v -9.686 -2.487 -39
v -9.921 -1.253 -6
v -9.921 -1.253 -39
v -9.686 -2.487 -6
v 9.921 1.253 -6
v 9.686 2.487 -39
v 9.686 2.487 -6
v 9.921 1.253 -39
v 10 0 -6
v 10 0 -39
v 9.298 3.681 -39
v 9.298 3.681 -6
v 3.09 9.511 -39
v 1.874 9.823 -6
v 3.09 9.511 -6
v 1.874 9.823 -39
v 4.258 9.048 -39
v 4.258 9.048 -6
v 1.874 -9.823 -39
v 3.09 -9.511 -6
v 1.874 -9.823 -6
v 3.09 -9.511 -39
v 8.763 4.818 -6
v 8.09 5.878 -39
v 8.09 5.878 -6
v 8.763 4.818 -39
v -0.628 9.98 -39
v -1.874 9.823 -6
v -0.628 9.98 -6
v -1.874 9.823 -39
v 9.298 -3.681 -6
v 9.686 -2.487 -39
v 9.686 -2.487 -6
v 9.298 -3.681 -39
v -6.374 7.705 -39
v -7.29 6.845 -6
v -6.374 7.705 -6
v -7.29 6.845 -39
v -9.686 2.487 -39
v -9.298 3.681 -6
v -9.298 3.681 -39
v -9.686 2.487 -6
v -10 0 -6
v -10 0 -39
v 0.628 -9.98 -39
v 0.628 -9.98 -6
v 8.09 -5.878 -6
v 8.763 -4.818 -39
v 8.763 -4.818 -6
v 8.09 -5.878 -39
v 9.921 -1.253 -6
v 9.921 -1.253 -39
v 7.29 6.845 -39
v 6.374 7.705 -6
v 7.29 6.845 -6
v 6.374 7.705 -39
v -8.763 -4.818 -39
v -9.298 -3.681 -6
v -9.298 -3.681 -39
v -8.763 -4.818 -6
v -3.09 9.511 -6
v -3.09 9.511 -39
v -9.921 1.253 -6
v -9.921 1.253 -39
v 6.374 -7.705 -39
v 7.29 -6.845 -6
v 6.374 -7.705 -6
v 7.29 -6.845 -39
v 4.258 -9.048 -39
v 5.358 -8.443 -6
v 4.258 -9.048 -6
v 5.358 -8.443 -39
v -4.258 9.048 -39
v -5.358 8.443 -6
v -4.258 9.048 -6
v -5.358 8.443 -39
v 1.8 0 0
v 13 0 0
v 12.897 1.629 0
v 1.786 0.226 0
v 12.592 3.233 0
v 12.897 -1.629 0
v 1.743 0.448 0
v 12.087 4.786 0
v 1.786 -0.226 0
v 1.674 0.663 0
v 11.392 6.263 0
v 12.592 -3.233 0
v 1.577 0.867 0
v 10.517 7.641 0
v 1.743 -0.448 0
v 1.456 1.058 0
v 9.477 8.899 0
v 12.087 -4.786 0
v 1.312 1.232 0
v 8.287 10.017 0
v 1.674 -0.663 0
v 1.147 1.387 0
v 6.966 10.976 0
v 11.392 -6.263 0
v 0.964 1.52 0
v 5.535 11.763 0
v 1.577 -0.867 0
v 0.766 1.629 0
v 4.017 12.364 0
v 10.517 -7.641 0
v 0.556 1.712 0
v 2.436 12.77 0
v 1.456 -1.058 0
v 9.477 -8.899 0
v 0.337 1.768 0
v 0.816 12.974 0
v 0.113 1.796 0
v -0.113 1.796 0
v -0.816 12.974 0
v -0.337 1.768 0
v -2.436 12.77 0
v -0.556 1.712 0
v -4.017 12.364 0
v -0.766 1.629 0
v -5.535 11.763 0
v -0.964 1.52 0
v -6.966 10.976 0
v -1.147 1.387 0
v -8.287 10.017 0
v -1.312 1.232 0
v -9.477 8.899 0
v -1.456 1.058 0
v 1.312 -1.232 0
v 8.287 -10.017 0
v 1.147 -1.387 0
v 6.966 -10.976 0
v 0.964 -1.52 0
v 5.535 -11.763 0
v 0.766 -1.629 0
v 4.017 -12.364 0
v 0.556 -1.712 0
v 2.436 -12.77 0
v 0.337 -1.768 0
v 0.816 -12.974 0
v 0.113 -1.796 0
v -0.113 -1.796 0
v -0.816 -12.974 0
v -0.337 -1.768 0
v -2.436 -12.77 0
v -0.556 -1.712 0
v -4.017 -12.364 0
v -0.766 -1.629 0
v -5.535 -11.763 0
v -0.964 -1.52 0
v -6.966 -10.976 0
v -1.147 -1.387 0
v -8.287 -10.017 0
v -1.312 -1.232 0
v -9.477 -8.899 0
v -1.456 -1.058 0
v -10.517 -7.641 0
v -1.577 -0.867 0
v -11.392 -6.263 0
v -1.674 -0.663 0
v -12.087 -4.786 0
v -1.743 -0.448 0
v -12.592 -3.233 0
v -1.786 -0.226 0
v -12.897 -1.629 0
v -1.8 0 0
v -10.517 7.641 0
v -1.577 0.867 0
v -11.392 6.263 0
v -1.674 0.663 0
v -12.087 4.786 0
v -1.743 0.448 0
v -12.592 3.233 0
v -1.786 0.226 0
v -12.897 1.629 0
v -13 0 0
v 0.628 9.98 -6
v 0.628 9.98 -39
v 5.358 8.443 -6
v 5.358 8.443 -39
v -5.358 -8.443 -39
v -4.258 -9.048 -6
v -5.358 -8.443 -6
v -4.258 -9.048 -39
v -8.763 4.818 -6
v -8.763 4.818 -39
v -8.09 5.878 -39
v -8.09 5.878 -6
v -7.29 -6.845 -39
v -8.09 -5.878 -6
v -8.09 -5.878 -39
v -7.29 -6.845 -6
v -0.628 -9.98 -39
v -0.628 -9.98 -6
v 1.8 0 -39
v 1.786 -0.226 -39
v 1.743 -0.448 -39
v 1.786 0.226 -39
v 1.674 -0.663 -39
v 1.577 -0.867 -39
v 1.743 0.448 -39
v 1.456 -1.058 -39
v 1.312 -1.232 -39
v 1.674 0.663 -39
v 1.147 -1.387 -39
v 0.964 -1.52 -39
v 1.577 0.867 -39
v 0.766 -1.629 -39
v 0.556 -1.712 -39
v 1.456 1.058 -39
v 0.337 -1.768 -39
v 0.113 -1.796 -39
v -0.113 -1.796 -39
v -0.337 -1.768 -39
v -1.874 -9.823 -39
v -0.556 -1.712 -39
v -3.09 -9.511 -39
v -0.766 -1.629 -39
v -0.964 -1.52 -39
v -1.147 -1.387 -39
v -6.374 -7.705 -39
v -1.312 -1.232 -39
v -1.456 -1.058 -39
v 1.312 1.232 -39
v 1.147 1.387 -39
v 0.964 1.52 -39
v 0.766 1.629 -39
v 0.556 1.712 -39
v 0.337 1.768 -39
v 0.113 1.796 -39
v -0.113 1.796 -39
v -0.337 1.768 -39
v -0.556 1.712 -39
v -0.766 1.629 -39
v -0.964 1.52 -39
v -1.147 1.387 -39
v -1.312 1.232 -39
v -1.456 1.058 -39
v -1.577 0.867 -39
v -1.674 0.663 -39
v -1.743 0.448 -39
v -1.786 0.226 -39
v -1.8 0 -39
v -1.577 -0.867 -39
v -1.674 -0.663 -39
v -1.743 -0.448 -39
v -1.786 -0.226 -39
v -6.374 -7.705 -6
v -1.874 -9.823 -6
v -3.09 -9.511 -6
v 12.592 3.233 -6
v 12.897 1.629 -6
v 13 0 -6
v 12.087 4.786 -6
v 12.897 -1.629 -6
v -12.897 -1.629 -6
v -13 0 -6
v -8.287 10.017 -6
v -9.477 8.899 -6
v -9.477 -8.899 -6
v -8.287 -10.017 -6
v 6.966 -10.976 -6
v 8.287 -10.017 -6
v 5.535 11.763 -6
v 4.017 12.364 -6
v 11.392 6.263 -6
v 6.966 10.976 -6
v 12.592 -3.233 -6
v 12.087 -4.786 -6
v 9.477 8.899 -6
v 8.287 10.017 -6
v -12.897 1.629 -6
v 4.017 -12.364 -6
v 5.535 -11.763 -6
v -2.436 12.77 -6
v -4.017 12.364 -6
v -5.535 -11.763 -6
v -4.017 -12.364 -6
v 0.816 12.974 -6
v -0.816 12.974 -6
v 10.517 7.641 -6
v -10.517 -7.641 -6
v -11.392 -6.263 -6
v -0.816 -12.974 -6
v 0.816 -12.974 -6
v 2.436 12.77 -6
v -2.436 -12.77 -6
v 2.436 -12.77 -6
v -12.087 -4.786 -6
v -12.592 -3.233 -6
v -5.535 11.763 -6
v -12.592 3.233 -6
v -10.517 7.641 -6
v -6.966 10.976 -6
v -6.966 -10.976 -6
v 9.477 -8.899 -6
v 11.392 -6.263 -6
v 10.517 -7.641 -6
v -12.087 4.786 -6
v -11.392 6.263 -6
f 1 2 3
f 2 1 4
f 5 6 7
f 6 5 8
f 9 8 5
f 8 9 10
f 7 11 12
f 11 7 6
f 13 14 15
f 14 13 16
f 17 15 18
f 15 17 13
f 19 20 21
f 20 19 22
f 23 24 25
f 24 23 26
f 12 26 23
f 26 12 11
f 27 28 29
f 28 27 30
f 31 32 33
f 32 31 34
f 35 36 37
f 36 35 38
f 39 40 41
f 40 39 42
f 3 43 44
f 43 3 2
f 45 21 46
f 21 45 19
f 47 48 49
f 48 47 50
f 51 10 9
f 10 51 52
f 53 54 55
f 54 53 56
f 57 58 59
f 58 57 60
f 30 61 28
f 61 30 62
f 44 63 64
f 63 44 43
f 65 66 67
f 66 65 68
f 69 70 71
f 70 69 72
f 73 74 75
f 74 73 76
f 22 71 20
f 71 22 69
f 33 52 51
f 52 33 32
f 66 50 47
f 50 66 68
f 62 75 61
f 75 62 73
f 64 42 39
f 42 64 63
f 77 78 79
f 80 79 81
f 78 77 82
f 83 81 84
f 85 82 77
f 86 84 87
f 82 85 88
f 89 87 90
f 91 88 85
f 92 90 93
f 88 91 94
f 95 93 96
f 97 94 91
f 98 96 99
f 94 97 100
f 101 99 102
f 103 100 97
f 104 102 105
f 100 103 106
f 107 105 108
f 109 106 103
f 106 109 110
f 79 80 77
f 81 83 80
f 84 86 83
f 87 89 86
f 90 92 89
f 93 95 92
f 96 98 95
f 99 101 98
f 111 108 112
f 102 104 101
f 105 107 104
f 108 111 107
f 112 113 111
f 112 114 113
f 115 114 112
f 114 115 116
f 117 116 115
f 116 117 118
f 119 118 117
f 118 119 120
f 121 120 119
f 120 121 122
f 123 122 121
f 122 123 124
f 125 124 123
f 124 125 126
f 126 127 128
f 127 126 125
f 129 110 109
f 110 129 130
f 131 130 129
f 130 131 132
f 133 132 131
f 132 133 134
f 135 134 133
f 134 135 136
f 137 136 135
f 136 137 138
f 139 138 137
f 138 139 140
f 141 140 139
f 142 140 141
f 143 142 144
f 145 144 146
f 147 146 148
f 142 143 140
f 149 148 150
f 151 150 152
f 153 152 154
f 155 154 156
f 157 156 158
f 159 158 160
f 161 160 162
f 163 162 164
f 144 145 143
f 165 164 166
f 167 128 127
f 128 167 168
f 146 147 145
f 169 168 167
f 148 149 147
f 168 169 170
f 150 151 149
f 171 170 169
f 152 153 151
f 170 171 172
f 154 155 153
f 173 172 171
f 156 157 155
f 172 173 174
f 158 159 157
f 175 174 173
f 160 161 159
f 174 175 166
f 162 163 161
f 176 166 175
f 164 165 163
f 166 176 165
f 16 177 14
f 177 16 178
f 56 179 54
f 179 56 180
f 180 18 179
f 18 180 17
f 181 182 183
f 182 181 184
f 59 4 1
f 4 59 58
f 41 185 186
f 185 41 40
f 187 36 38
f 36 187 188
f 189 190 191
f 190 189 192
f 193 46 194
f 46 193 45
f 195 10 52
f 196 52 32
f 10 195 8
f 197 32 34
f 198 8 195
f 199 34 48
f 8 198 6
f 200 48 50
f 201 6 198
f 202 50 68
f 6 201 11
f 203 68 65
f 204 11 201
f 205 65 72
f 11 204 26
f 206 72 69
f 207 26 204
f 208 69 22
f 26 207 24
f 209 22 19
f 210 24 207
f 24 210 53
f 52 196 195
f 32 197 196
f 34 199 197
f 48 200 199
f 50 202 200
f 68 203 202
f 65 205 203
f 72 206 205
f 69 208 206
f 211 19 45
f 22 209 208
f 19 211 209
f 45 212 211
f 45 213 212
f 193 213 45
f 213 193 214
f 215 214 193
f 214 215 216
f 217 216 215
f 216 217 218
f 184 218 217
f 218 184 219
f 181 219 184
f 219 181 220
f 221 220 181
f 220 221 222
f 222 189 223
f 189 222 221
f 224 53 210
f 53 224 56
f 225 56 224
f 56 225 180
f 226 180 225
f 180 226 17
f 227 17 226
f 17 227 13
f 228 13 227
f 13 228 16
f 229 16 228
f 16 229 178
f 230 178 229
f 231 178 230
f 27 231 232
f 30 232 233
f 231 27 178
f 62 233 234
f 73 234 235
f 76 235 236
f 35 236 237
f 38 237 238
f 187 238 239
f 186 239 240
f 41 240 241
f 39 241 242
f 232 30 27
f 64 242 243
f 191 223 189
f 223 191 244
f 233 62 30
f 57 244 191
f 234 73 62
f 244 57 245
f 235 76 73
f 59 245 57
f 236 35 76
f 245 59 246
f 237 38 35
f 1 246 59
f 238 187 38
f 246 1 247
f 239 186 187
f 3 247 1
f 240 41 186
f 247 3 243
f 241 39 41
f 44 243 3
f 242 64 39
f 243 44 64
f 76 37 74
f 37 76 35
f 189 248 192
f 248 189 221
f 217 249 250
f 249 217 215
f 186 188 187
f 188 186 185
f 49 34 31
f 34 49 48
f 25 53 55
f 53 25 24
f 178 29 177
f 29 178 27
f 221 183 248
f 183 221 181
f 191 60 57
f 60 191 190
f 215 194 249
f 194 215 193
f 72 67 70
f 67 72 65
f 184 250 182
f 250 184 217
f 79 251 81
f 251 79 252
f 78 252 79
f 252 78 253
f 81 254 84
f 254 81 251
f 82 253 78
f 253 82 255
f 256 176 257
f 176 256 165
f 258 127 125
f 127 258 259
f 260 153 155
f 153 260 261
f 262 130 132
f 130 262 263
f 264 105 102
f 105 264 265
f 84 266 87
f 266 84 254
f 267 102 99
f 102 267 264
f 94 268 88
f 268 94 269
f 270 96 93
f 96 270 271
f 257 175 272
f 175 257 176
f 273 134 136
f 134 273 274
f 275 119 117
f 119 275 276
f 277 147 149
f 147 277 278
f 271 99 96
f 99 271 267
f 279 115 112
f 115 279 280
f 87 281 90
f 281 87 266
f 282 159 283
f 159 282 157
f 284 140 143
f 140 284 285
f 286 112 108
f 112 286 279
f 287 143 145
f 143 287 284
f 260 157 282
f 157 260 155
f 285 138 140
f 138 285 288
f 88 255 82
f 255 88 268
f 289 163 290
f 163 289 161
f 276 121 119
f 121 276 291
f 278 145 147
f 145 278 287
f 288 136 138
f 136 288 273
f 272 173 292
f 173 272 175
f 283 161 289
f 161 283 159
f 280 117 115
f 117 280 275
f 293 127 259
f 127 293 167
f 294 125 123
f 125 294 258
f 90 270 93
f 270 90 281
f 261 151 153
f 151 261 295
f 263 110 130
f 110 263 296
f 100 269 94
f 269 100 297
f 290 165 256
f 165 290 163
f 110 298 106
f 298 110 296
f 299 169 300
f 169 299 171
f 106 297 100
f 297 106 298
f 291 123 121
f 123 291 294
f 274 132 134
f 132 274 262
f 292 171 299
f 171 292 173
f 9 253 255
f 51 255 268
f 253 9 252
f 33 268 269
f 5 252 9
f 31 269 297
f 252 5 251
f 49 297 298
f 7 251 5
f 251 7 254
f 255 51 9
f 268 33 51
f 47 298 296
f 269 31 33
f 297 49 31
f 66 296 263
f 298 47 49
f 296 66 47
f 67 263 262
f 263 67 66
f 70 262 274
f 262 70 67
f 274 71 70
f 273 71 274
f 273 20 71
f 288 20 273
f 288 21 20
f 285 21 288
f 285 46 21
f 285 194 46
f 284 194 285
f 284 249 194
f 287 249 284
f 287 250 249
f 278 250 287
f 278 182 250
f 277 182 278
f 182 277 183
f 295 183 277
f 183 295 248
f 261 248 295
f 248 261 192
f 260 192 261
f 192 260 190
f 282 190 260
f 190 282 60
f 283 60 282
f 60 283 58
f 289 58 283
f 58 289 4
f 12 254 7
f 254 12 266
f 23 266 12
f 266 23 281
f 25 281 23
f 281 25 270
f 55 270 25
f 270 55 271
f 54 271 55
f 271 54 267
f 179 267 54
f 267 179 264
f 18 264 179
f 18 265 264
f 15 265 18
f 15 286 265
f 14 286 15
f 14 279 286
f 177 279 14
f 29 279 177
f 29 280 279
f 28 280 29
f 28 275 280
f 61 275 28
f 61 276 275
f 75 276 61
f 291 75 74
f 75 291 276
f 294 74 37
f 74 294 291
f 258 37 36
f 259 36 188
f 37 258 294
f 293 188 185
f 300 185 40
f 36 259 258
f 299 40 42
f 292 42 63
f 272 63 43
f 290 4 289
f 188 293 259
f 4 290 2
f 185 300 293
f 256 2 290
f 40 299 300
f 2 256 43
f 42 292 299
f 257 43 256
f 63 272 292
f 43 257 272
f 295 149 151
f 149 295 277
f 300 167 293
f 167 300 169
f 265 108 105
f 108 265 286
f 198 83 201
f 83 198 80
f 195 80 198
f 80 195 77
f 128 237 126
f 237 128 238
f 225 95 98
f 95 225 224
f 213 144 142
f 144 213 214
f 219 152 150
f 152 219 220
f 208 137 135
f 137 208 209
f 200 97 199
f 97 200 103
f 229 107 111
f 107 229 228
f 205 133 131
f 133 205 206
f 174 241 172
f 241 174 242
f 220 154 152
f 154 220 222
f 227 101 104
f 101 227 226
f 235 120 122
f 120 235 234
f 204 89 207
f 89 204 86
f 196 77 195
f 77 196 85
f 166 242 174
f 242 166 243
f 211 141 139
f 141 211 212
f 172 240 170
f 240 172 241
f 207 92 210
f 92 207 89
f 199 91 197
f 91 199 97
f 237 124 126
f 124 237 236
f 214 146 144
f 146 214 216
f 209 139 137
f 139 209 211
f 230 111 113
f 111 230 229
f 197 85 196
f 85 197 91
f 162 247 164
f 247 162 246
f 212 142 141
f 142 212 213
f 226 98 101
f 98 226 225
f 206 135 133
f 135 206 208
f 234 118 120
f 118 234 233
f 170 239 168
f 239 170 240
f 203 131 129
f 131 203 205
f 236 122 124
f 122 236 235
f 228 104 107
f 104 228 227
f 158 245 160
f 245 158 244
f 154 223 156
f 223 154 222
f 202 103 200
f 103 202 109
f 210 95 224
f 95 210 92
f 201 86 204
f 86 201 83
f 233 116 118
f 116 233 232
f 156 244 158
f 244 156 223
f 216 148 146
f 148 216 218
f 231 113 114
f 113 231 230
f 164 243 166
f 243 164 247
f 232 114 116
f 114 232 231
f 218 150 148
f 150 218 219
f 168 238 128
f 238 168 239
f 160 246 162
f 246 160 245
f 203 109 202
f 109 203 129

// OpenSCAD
$fn = 50;


difference() {
	union() {
		translate(v = [0, 0, -39.0000000000]) {
			cylinder(h = 39, r = 10.0000000000);
		}
		translate(v = [0, 0, -6.0000000000]) {
			cylinder(h = 6, r = 13.0000000000);
		}
	}
	union() {
		#translate(v = [0, 0, -39]) {
			cylinder(h = 39, r = 1.8000000000);
		}
	}
}
